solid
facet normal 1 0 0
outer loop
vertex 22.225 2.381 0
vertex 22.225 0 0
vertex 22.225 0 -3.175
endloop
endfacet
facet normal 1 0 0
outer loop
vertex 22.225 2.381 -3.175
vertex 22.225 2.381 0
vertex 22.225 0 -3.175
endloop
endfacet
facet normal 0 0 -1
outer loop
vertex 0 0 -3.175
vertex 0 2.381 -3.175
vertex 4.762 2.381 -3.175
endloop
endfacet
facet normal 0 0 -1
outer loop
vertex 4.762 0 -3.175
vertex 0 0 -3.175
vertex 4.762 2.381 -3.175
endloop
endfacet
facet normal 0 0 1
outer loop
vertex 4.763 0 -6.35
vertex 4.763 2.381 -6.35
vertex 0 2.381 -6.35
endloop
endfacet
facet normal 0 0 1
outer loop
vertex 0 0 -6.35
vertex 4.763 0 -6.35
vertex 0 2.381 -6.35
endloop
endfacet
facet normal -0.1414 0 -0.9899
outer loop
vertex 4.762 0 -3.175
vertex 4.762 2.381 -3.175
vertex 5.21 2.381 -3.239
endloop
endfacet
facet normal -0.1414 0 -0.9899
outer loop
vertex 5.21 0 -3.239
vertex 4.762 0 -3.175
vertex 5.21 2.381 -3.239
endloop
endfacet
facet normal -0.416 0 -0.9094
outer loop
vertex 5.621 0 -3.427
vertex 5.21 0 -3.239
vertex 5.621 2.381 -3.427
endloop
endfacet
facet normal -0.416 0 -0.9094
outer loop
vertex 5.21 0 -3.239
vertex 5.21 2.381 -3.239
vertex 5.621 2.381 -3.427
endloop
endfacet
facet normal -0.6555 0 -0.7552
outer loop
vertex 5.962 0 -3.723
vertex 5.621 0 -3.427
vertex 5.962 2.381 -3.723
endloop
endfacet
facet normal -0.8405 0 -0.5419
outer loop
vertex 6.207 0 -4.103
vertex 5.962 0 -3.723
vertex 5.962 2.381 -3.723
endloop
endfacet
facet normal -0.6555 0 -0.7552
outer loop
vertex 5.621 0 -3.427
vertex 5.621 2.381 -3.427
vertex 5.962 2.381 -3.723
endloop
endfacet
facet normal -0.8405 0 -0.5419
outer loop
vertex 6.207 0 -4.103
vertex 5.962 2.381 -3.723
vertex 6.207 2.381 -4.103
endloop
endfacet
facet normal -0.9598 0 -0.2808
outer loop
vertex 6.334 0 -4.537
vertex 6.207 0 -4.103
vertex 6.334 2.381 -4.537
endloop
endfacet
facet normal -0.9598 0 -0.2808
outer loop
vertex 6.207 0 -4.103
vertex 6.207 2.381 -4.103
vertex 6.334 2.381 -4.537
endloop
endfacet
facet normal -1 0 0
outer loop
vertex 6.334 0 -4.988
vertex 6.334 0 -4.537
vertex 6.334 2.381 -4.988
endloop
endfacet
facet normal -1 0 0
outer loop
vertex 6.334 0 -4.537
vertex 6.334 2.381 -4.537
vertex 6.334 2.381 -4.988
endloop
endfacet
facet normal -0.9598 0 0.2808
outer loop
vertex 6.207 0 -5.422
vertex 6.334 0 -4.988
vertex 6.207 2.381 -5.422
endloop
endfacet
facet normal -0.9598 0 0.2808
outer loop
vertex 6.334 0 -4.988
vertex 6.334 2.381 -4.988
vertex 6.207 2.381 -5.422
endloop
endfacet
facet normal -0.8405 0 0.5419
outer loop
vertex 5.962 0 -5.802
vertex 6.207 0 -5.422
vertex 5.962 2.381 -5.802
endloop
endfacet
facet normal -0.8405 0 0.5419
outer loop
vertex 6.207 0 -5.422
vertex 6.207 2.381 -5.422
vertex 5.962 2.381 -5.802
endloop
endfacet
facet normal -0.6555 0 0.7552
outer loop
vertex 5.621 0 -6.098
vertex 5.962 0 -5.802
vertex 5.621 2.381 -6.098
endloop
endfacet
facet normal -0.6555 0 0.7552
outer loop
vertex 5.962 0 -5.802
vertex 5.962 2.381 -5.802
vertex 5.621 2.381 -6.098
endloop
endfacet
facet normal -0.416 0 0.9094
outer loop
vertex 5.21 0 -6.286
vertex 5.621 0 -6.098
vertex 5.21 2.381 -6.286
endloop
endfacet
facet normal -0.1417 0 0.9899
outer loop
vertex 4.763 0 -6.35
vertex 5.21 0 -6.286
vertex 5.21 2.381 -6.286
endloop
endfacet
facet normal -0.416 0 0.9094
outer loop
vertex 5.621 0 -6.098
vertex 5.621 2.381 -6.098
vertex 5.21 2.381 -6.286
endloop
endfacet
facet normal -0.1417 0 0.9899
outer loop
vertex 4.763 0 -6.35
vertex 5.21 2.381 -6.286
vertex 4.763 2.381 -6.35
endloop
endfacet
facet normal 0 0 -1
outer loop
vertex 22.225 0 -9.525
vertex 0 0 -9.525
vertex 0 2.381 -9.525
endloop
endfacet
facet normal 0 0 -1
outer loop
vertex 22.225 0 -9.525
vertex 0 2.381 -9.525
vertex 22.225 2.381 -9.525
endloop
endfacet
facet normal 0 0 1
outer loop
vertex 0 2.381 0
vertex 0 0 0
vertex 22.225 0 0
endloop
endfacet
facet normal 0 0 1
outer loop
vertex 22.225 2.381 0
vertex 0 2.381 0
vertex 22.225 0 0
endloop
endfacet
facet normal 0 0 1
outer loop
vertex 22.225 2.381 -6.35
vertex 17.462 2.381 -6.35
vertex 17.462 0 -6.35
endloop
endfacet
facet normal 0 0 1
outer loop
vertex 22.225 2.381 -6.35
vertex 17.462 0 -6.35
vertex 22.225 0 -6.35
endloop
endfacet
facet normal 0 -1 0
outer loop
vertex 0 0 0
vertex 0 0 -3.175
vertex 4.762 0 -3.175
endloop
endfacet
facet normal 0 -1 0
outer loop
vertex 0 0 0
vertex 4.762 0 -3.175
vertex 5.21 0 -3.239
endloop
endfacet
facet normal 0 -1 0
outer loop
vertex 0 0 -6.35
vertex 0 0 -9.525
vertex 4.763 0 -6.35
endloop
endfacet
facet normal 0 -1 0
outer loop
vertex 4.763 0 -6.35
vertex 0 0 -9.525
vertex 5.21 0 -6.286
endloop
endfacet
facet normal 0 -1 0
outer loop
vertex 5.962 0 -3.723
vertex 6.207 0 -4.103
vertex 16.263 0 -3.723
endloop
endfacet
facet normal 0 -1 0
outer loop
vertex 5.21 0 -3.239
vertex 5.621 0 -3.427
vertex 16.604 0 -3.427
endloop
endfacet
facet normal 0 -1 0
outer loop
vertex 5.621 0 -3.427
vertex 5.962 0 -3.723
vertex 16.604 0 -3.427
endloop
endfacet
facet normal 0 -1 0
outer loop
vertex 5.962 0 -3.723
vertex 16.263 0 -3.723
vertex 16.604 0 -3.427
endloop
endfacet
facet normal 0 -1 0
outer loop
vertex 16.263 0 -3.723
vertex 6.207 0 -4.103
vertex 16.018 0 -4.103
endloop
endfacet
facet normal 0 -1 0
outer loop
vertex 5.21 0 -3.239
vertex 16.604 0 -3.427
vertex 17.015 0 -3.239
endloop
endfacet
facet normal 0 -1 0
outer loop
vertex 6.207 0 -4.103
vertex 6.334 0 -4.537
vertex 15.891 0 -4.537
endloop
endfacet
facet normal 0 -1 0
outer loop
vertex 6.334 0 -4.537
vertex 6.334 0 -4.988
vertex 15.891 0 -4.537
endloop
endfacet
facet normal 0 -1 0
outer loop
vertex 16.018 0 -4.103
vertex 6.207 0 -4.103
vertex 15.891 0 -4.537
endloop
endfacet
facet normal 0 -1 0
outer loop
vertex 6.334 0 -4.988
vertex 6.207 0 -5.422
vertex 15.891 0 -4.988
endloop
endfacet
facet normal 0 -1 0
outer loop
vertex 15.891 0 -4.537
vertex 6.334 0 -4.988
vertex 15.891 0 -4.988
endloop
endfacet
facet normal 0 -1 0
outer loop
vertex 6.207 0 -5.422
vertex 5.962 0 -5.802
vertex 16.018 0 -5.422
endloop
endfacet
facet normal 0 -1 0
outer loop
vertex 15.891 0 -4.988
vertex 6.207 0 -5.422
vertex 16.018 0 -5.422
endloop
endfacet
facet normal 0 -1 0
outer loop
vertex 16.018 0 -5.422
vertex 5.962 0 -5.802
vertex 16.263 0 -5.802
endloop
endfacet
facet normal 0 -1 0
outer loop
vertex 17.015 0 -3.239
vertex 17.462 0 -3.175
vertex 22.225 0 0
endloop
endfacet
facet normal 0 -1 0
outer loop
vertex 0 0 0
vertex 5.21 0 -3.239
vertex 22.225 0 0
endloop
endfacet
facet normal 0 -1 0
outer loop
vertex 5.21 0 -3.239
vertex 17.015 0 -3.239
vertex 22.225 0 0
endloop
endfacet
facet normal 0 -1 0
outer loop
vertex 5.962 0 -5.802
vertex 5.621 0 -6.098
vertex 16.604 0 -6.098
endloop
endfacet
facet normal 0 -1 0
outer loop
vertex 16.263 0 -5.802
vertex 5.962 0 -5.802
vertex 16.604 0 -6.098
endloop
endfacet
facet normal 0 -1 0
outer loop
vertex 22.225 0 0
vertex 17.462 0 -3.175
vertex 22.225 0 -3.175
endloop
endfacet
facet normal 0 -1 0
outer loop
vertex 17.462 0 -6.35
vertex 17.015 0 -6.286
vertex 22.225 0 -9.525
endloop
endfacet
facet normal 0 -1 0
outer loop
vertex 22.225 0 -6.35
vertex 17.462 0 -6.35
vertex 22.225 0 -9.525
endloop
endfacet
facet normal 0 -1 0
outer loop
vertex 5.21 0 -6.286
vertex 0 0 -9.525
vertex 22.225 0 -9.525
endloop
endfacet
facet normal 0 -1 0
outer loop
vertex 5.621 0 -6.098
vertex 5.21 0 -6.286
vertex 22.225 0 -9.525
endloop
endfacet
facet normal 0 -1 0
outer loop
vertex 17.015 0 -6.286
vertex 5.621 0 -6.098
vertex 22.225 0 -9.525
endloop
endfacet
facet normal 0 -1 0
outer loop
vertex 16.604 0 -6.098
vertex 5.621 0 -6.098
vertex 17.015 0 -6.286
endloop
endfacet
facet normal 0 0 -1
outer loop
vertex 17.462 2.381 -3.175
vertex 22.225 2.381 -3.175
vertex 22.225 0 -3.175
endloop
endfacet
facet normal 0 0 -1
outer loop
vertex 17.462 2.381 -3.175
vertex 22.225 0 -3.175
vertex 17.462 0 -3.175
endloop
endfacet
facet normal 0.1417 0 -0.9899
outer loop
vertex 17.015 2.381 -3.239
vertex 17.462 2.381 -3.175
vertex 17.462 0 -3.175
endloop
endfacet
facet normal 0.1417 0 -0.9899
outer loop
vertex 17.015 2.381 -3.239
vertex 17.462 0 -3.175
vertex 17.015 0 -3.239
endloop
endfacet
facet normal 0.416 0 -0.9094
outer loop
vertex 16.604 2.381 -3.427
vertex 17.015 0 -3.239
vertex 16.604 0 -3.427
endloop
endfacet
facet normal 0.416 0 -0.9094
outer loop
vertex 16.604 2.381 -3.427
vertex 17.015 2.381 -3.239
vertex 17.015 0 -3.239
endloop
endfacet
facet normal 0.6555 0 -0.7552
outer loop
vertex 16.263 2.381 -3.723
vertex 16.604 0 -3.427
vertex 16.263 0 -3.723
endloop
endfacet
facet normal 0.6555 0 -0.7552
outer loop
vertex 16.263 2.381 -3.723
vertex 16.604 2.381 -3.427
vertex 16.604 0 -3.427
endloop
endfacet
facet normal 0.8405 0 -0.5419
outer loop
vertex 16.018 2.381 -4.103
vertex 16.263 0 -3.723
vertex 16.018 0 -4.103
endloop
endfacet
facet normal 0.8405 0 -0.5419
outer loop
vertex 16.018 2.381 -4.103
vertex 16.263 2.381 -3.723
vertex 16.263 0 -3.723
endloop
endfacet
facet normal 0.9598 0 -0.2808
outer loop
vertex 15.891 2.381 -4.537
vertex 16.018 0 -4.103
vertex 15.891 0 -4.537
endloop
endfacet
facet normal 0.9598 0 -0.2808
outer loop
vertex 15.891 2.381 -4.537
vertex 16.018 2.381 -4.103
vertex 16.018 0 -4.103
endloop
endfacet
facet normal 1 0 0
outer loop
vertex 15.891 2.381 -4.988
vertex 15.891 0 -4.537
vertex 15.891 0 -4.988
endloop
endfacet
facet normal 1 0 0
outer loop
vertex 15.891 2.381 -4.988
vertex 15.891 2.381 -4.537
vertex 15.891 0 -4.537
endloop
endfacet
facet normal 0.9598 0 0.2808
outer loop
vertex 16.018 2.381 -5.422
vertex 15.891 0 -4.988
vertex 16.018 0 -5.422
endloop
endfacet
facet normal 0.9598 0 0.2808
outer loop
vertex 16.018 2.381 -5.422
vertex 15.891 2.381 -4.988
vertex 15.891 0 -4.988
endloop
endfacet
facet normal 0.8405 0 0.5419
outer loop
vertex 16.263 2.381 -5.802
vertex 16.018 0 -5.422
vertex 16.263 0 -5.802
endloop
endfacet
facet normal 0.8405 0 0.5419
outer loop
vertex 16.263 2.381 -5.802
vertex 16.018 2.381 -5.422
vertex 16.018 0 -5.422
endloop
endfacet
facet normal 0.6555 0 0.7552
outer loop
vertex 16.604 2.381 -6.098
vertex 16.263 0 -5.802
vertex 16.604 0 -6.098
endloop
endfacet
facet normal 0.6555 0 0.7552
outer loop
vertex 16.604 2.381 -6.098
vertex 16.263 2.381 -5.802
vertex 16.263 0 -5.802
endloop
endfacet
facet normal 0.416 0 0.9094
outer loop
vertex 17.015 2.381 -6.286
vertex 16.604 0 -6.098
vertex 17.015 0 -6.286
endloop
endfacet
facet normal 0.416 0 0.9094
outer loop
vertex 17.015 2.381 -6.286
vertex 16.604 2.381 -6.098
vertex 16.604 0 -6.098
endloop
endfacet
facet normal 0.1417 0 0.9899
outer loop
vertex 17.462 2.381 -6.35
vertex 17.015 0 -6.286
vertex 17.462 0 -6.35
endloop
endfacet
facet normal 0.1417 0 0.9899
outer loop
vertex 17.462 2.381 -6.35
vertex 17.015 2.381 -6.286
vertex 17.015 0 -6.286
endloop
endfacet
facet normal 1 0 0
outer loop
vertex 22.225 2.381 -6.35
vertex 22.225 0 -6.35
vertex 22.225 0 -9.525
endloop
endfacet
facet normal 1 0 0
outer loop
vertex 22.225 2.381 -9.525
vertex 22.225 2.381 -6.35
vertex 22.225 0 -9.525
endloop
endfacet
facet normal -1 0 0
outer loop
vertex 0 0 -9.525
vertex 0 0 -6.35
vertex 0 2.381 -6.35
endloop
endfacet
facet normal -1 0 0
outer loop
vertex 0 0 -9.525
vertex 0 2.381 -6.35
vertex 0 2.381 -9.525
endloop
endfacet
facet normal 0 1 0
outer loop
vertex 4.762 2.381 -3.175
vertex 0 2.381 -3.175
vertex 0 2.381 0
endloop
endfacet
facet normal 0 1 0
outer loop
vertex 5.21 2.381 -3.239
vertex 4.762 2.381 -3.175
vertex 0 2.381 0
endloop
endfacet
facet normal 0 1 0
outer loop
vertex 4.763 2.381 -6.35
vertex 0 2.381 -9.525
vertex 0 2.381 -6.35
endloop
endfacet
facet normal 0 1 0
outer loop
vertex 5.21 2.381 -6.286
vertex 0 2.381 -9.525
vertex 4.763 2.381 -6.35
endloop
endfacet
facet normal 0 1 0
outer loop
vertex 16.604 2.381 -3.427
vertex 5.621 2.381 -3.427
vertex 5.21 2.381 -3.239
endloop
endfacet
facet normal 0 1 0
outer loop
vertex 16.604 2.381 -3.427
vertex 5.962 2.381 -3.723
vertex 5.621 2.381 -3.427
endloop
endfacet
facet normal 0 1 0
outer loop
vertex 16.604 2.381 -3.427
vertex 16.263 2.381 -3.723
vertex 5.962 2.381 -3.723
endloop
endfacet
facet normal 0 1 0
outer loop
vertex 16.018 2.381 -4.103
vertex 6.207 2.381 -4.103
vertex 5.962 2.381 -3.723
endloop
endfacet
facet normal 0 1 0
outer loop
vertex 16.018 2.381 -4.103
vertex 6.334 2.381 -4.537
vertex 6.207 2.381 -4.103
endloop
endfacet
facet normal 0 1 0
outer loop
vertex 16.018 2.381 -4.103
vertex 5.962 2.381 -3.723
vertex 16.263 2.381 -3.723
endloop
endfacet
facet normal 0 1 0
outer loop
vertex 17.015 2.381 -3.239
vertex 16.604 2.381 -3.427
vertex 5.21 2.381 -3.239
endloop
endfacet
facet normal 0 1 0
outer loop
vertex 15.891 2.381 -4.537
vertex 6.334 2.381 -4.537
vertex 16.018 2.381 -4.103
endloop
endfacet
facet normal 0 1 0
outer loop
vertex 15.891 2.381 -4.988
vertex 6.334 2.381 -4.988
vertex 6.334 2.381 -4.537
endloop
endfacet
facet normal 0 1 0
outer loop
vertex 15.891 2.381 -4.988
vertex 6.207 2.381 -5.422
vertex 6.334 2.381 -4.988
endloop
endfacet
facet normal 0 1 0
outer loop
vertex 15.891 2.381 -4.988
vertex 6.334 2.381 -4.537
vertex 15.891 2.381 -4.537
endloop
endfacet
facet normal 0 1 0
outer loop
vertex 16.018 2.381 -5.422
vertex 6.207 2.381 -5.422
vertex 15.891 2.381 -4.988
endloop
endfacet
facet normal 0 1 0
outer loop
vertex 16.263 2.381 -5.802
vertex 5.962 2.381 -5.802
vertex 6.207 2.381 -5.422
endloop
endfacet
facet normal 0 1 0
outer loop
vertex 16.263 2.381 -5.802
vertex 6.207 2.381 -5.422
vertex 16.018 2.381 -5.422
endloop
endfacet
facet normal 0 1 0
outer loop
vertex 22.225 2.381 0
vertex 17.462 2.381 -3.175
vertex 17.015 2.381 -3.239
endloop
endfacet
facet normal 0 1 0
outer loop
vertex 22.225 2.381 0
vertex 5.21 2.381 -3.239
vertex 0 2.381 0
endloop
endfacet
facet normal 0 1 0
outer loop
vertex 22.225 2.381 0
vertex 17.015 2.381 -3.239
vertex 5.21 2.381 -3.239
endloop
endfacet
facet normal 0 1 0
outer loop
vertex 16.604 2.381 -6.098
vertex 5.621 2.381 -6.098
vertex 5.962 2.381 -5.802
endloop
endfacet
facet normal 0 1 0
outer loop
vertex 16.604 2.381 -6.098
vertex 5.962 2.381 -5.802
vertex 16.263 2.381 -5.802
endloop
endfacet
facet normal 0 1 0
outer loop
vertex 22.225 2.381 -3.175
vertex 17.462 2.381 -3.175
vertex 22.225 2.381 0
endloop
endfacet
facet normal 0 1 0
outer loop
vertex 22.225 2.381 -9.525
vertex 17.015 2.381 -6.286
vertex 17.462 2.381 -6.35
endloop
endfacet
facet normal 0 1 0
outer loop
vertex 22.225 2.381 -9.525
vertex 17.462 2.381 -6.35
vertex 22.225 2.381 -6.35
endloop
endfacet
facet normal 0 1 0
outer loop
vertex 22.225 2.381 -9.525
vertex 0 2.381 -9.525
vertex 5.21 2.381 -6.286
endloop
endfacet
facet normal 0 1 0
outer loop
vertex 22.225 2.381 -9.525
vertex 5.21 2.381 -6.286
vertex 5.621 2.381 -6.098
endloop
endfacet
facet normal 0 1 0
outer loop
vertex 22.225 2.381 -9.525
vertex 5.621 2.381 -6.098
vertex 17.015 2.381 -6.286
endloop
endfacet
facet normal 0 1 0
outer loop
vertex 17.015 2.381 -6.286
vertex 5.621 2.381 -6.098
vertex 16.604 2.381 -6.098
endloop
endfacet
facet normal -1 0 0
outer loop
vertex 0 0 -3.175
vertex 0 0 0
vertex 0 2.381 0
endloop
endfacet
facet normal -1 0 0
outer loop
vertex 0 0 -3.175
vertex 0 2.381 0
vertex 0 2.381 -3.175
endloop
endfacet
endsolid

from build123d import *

# Parameters (mm, degrees)
SKETCH1_W           = 22.225
SKETCH1_H           = 9.525
BOSS_EXTRUDE1_DEPTH = 2.38125
CUT_EXTRUDE1_DEPTH  = 3.38125


with BuildPart() as part:
    # Sketch1 → Boss-Extrude1 (new body)
    with BuildSketch(Plane(origin=(0, 0, 0), x_dir=(1, 0, 0), z_dir=(0, 1, 0))):
        with Locations((11.1125, 4.7625)):
            Rectangle(SKETCH1_W, SKETCH1_H)
    extrude(amount=BOSS_EXTRUDE1_DEPTH)

    # Sketch2 → Cut-Extrude1 (cut, through all)
    with BuildSketch(Plane(origin=(0, 2.38125, 0), x_dir=(1, 0, 0), z_dir=(0, 1, 0))):
        with BuildLine():
            Line((0, 3.175), (4.7625, 3.175))
            ThreePointArc((4.7625, 3.175), (6.35, 4.7625), (4.7625, 6.35))
            Line((4.7625, 6.35), (0, 6.35))
            Line((0, 6.35), (0, 3.175))
        make_face()
        with BuildLine():
            Line((22.225, 6.35), (22.225, 3.175))
            Line((22.225, 3.175), (17.4625, 3.175))
            ThreePointArc((17.4625, 3.175), (15.875, 4.7625), (17.4625, 6.35))
            Line((17.4625, 6.35), (22.225, 6.35))
        make_face()
    extrude(amount=-CUT_EXTRUDE1_DEPTH, mode=Mode.SUBTRACT)


solid = part.part
